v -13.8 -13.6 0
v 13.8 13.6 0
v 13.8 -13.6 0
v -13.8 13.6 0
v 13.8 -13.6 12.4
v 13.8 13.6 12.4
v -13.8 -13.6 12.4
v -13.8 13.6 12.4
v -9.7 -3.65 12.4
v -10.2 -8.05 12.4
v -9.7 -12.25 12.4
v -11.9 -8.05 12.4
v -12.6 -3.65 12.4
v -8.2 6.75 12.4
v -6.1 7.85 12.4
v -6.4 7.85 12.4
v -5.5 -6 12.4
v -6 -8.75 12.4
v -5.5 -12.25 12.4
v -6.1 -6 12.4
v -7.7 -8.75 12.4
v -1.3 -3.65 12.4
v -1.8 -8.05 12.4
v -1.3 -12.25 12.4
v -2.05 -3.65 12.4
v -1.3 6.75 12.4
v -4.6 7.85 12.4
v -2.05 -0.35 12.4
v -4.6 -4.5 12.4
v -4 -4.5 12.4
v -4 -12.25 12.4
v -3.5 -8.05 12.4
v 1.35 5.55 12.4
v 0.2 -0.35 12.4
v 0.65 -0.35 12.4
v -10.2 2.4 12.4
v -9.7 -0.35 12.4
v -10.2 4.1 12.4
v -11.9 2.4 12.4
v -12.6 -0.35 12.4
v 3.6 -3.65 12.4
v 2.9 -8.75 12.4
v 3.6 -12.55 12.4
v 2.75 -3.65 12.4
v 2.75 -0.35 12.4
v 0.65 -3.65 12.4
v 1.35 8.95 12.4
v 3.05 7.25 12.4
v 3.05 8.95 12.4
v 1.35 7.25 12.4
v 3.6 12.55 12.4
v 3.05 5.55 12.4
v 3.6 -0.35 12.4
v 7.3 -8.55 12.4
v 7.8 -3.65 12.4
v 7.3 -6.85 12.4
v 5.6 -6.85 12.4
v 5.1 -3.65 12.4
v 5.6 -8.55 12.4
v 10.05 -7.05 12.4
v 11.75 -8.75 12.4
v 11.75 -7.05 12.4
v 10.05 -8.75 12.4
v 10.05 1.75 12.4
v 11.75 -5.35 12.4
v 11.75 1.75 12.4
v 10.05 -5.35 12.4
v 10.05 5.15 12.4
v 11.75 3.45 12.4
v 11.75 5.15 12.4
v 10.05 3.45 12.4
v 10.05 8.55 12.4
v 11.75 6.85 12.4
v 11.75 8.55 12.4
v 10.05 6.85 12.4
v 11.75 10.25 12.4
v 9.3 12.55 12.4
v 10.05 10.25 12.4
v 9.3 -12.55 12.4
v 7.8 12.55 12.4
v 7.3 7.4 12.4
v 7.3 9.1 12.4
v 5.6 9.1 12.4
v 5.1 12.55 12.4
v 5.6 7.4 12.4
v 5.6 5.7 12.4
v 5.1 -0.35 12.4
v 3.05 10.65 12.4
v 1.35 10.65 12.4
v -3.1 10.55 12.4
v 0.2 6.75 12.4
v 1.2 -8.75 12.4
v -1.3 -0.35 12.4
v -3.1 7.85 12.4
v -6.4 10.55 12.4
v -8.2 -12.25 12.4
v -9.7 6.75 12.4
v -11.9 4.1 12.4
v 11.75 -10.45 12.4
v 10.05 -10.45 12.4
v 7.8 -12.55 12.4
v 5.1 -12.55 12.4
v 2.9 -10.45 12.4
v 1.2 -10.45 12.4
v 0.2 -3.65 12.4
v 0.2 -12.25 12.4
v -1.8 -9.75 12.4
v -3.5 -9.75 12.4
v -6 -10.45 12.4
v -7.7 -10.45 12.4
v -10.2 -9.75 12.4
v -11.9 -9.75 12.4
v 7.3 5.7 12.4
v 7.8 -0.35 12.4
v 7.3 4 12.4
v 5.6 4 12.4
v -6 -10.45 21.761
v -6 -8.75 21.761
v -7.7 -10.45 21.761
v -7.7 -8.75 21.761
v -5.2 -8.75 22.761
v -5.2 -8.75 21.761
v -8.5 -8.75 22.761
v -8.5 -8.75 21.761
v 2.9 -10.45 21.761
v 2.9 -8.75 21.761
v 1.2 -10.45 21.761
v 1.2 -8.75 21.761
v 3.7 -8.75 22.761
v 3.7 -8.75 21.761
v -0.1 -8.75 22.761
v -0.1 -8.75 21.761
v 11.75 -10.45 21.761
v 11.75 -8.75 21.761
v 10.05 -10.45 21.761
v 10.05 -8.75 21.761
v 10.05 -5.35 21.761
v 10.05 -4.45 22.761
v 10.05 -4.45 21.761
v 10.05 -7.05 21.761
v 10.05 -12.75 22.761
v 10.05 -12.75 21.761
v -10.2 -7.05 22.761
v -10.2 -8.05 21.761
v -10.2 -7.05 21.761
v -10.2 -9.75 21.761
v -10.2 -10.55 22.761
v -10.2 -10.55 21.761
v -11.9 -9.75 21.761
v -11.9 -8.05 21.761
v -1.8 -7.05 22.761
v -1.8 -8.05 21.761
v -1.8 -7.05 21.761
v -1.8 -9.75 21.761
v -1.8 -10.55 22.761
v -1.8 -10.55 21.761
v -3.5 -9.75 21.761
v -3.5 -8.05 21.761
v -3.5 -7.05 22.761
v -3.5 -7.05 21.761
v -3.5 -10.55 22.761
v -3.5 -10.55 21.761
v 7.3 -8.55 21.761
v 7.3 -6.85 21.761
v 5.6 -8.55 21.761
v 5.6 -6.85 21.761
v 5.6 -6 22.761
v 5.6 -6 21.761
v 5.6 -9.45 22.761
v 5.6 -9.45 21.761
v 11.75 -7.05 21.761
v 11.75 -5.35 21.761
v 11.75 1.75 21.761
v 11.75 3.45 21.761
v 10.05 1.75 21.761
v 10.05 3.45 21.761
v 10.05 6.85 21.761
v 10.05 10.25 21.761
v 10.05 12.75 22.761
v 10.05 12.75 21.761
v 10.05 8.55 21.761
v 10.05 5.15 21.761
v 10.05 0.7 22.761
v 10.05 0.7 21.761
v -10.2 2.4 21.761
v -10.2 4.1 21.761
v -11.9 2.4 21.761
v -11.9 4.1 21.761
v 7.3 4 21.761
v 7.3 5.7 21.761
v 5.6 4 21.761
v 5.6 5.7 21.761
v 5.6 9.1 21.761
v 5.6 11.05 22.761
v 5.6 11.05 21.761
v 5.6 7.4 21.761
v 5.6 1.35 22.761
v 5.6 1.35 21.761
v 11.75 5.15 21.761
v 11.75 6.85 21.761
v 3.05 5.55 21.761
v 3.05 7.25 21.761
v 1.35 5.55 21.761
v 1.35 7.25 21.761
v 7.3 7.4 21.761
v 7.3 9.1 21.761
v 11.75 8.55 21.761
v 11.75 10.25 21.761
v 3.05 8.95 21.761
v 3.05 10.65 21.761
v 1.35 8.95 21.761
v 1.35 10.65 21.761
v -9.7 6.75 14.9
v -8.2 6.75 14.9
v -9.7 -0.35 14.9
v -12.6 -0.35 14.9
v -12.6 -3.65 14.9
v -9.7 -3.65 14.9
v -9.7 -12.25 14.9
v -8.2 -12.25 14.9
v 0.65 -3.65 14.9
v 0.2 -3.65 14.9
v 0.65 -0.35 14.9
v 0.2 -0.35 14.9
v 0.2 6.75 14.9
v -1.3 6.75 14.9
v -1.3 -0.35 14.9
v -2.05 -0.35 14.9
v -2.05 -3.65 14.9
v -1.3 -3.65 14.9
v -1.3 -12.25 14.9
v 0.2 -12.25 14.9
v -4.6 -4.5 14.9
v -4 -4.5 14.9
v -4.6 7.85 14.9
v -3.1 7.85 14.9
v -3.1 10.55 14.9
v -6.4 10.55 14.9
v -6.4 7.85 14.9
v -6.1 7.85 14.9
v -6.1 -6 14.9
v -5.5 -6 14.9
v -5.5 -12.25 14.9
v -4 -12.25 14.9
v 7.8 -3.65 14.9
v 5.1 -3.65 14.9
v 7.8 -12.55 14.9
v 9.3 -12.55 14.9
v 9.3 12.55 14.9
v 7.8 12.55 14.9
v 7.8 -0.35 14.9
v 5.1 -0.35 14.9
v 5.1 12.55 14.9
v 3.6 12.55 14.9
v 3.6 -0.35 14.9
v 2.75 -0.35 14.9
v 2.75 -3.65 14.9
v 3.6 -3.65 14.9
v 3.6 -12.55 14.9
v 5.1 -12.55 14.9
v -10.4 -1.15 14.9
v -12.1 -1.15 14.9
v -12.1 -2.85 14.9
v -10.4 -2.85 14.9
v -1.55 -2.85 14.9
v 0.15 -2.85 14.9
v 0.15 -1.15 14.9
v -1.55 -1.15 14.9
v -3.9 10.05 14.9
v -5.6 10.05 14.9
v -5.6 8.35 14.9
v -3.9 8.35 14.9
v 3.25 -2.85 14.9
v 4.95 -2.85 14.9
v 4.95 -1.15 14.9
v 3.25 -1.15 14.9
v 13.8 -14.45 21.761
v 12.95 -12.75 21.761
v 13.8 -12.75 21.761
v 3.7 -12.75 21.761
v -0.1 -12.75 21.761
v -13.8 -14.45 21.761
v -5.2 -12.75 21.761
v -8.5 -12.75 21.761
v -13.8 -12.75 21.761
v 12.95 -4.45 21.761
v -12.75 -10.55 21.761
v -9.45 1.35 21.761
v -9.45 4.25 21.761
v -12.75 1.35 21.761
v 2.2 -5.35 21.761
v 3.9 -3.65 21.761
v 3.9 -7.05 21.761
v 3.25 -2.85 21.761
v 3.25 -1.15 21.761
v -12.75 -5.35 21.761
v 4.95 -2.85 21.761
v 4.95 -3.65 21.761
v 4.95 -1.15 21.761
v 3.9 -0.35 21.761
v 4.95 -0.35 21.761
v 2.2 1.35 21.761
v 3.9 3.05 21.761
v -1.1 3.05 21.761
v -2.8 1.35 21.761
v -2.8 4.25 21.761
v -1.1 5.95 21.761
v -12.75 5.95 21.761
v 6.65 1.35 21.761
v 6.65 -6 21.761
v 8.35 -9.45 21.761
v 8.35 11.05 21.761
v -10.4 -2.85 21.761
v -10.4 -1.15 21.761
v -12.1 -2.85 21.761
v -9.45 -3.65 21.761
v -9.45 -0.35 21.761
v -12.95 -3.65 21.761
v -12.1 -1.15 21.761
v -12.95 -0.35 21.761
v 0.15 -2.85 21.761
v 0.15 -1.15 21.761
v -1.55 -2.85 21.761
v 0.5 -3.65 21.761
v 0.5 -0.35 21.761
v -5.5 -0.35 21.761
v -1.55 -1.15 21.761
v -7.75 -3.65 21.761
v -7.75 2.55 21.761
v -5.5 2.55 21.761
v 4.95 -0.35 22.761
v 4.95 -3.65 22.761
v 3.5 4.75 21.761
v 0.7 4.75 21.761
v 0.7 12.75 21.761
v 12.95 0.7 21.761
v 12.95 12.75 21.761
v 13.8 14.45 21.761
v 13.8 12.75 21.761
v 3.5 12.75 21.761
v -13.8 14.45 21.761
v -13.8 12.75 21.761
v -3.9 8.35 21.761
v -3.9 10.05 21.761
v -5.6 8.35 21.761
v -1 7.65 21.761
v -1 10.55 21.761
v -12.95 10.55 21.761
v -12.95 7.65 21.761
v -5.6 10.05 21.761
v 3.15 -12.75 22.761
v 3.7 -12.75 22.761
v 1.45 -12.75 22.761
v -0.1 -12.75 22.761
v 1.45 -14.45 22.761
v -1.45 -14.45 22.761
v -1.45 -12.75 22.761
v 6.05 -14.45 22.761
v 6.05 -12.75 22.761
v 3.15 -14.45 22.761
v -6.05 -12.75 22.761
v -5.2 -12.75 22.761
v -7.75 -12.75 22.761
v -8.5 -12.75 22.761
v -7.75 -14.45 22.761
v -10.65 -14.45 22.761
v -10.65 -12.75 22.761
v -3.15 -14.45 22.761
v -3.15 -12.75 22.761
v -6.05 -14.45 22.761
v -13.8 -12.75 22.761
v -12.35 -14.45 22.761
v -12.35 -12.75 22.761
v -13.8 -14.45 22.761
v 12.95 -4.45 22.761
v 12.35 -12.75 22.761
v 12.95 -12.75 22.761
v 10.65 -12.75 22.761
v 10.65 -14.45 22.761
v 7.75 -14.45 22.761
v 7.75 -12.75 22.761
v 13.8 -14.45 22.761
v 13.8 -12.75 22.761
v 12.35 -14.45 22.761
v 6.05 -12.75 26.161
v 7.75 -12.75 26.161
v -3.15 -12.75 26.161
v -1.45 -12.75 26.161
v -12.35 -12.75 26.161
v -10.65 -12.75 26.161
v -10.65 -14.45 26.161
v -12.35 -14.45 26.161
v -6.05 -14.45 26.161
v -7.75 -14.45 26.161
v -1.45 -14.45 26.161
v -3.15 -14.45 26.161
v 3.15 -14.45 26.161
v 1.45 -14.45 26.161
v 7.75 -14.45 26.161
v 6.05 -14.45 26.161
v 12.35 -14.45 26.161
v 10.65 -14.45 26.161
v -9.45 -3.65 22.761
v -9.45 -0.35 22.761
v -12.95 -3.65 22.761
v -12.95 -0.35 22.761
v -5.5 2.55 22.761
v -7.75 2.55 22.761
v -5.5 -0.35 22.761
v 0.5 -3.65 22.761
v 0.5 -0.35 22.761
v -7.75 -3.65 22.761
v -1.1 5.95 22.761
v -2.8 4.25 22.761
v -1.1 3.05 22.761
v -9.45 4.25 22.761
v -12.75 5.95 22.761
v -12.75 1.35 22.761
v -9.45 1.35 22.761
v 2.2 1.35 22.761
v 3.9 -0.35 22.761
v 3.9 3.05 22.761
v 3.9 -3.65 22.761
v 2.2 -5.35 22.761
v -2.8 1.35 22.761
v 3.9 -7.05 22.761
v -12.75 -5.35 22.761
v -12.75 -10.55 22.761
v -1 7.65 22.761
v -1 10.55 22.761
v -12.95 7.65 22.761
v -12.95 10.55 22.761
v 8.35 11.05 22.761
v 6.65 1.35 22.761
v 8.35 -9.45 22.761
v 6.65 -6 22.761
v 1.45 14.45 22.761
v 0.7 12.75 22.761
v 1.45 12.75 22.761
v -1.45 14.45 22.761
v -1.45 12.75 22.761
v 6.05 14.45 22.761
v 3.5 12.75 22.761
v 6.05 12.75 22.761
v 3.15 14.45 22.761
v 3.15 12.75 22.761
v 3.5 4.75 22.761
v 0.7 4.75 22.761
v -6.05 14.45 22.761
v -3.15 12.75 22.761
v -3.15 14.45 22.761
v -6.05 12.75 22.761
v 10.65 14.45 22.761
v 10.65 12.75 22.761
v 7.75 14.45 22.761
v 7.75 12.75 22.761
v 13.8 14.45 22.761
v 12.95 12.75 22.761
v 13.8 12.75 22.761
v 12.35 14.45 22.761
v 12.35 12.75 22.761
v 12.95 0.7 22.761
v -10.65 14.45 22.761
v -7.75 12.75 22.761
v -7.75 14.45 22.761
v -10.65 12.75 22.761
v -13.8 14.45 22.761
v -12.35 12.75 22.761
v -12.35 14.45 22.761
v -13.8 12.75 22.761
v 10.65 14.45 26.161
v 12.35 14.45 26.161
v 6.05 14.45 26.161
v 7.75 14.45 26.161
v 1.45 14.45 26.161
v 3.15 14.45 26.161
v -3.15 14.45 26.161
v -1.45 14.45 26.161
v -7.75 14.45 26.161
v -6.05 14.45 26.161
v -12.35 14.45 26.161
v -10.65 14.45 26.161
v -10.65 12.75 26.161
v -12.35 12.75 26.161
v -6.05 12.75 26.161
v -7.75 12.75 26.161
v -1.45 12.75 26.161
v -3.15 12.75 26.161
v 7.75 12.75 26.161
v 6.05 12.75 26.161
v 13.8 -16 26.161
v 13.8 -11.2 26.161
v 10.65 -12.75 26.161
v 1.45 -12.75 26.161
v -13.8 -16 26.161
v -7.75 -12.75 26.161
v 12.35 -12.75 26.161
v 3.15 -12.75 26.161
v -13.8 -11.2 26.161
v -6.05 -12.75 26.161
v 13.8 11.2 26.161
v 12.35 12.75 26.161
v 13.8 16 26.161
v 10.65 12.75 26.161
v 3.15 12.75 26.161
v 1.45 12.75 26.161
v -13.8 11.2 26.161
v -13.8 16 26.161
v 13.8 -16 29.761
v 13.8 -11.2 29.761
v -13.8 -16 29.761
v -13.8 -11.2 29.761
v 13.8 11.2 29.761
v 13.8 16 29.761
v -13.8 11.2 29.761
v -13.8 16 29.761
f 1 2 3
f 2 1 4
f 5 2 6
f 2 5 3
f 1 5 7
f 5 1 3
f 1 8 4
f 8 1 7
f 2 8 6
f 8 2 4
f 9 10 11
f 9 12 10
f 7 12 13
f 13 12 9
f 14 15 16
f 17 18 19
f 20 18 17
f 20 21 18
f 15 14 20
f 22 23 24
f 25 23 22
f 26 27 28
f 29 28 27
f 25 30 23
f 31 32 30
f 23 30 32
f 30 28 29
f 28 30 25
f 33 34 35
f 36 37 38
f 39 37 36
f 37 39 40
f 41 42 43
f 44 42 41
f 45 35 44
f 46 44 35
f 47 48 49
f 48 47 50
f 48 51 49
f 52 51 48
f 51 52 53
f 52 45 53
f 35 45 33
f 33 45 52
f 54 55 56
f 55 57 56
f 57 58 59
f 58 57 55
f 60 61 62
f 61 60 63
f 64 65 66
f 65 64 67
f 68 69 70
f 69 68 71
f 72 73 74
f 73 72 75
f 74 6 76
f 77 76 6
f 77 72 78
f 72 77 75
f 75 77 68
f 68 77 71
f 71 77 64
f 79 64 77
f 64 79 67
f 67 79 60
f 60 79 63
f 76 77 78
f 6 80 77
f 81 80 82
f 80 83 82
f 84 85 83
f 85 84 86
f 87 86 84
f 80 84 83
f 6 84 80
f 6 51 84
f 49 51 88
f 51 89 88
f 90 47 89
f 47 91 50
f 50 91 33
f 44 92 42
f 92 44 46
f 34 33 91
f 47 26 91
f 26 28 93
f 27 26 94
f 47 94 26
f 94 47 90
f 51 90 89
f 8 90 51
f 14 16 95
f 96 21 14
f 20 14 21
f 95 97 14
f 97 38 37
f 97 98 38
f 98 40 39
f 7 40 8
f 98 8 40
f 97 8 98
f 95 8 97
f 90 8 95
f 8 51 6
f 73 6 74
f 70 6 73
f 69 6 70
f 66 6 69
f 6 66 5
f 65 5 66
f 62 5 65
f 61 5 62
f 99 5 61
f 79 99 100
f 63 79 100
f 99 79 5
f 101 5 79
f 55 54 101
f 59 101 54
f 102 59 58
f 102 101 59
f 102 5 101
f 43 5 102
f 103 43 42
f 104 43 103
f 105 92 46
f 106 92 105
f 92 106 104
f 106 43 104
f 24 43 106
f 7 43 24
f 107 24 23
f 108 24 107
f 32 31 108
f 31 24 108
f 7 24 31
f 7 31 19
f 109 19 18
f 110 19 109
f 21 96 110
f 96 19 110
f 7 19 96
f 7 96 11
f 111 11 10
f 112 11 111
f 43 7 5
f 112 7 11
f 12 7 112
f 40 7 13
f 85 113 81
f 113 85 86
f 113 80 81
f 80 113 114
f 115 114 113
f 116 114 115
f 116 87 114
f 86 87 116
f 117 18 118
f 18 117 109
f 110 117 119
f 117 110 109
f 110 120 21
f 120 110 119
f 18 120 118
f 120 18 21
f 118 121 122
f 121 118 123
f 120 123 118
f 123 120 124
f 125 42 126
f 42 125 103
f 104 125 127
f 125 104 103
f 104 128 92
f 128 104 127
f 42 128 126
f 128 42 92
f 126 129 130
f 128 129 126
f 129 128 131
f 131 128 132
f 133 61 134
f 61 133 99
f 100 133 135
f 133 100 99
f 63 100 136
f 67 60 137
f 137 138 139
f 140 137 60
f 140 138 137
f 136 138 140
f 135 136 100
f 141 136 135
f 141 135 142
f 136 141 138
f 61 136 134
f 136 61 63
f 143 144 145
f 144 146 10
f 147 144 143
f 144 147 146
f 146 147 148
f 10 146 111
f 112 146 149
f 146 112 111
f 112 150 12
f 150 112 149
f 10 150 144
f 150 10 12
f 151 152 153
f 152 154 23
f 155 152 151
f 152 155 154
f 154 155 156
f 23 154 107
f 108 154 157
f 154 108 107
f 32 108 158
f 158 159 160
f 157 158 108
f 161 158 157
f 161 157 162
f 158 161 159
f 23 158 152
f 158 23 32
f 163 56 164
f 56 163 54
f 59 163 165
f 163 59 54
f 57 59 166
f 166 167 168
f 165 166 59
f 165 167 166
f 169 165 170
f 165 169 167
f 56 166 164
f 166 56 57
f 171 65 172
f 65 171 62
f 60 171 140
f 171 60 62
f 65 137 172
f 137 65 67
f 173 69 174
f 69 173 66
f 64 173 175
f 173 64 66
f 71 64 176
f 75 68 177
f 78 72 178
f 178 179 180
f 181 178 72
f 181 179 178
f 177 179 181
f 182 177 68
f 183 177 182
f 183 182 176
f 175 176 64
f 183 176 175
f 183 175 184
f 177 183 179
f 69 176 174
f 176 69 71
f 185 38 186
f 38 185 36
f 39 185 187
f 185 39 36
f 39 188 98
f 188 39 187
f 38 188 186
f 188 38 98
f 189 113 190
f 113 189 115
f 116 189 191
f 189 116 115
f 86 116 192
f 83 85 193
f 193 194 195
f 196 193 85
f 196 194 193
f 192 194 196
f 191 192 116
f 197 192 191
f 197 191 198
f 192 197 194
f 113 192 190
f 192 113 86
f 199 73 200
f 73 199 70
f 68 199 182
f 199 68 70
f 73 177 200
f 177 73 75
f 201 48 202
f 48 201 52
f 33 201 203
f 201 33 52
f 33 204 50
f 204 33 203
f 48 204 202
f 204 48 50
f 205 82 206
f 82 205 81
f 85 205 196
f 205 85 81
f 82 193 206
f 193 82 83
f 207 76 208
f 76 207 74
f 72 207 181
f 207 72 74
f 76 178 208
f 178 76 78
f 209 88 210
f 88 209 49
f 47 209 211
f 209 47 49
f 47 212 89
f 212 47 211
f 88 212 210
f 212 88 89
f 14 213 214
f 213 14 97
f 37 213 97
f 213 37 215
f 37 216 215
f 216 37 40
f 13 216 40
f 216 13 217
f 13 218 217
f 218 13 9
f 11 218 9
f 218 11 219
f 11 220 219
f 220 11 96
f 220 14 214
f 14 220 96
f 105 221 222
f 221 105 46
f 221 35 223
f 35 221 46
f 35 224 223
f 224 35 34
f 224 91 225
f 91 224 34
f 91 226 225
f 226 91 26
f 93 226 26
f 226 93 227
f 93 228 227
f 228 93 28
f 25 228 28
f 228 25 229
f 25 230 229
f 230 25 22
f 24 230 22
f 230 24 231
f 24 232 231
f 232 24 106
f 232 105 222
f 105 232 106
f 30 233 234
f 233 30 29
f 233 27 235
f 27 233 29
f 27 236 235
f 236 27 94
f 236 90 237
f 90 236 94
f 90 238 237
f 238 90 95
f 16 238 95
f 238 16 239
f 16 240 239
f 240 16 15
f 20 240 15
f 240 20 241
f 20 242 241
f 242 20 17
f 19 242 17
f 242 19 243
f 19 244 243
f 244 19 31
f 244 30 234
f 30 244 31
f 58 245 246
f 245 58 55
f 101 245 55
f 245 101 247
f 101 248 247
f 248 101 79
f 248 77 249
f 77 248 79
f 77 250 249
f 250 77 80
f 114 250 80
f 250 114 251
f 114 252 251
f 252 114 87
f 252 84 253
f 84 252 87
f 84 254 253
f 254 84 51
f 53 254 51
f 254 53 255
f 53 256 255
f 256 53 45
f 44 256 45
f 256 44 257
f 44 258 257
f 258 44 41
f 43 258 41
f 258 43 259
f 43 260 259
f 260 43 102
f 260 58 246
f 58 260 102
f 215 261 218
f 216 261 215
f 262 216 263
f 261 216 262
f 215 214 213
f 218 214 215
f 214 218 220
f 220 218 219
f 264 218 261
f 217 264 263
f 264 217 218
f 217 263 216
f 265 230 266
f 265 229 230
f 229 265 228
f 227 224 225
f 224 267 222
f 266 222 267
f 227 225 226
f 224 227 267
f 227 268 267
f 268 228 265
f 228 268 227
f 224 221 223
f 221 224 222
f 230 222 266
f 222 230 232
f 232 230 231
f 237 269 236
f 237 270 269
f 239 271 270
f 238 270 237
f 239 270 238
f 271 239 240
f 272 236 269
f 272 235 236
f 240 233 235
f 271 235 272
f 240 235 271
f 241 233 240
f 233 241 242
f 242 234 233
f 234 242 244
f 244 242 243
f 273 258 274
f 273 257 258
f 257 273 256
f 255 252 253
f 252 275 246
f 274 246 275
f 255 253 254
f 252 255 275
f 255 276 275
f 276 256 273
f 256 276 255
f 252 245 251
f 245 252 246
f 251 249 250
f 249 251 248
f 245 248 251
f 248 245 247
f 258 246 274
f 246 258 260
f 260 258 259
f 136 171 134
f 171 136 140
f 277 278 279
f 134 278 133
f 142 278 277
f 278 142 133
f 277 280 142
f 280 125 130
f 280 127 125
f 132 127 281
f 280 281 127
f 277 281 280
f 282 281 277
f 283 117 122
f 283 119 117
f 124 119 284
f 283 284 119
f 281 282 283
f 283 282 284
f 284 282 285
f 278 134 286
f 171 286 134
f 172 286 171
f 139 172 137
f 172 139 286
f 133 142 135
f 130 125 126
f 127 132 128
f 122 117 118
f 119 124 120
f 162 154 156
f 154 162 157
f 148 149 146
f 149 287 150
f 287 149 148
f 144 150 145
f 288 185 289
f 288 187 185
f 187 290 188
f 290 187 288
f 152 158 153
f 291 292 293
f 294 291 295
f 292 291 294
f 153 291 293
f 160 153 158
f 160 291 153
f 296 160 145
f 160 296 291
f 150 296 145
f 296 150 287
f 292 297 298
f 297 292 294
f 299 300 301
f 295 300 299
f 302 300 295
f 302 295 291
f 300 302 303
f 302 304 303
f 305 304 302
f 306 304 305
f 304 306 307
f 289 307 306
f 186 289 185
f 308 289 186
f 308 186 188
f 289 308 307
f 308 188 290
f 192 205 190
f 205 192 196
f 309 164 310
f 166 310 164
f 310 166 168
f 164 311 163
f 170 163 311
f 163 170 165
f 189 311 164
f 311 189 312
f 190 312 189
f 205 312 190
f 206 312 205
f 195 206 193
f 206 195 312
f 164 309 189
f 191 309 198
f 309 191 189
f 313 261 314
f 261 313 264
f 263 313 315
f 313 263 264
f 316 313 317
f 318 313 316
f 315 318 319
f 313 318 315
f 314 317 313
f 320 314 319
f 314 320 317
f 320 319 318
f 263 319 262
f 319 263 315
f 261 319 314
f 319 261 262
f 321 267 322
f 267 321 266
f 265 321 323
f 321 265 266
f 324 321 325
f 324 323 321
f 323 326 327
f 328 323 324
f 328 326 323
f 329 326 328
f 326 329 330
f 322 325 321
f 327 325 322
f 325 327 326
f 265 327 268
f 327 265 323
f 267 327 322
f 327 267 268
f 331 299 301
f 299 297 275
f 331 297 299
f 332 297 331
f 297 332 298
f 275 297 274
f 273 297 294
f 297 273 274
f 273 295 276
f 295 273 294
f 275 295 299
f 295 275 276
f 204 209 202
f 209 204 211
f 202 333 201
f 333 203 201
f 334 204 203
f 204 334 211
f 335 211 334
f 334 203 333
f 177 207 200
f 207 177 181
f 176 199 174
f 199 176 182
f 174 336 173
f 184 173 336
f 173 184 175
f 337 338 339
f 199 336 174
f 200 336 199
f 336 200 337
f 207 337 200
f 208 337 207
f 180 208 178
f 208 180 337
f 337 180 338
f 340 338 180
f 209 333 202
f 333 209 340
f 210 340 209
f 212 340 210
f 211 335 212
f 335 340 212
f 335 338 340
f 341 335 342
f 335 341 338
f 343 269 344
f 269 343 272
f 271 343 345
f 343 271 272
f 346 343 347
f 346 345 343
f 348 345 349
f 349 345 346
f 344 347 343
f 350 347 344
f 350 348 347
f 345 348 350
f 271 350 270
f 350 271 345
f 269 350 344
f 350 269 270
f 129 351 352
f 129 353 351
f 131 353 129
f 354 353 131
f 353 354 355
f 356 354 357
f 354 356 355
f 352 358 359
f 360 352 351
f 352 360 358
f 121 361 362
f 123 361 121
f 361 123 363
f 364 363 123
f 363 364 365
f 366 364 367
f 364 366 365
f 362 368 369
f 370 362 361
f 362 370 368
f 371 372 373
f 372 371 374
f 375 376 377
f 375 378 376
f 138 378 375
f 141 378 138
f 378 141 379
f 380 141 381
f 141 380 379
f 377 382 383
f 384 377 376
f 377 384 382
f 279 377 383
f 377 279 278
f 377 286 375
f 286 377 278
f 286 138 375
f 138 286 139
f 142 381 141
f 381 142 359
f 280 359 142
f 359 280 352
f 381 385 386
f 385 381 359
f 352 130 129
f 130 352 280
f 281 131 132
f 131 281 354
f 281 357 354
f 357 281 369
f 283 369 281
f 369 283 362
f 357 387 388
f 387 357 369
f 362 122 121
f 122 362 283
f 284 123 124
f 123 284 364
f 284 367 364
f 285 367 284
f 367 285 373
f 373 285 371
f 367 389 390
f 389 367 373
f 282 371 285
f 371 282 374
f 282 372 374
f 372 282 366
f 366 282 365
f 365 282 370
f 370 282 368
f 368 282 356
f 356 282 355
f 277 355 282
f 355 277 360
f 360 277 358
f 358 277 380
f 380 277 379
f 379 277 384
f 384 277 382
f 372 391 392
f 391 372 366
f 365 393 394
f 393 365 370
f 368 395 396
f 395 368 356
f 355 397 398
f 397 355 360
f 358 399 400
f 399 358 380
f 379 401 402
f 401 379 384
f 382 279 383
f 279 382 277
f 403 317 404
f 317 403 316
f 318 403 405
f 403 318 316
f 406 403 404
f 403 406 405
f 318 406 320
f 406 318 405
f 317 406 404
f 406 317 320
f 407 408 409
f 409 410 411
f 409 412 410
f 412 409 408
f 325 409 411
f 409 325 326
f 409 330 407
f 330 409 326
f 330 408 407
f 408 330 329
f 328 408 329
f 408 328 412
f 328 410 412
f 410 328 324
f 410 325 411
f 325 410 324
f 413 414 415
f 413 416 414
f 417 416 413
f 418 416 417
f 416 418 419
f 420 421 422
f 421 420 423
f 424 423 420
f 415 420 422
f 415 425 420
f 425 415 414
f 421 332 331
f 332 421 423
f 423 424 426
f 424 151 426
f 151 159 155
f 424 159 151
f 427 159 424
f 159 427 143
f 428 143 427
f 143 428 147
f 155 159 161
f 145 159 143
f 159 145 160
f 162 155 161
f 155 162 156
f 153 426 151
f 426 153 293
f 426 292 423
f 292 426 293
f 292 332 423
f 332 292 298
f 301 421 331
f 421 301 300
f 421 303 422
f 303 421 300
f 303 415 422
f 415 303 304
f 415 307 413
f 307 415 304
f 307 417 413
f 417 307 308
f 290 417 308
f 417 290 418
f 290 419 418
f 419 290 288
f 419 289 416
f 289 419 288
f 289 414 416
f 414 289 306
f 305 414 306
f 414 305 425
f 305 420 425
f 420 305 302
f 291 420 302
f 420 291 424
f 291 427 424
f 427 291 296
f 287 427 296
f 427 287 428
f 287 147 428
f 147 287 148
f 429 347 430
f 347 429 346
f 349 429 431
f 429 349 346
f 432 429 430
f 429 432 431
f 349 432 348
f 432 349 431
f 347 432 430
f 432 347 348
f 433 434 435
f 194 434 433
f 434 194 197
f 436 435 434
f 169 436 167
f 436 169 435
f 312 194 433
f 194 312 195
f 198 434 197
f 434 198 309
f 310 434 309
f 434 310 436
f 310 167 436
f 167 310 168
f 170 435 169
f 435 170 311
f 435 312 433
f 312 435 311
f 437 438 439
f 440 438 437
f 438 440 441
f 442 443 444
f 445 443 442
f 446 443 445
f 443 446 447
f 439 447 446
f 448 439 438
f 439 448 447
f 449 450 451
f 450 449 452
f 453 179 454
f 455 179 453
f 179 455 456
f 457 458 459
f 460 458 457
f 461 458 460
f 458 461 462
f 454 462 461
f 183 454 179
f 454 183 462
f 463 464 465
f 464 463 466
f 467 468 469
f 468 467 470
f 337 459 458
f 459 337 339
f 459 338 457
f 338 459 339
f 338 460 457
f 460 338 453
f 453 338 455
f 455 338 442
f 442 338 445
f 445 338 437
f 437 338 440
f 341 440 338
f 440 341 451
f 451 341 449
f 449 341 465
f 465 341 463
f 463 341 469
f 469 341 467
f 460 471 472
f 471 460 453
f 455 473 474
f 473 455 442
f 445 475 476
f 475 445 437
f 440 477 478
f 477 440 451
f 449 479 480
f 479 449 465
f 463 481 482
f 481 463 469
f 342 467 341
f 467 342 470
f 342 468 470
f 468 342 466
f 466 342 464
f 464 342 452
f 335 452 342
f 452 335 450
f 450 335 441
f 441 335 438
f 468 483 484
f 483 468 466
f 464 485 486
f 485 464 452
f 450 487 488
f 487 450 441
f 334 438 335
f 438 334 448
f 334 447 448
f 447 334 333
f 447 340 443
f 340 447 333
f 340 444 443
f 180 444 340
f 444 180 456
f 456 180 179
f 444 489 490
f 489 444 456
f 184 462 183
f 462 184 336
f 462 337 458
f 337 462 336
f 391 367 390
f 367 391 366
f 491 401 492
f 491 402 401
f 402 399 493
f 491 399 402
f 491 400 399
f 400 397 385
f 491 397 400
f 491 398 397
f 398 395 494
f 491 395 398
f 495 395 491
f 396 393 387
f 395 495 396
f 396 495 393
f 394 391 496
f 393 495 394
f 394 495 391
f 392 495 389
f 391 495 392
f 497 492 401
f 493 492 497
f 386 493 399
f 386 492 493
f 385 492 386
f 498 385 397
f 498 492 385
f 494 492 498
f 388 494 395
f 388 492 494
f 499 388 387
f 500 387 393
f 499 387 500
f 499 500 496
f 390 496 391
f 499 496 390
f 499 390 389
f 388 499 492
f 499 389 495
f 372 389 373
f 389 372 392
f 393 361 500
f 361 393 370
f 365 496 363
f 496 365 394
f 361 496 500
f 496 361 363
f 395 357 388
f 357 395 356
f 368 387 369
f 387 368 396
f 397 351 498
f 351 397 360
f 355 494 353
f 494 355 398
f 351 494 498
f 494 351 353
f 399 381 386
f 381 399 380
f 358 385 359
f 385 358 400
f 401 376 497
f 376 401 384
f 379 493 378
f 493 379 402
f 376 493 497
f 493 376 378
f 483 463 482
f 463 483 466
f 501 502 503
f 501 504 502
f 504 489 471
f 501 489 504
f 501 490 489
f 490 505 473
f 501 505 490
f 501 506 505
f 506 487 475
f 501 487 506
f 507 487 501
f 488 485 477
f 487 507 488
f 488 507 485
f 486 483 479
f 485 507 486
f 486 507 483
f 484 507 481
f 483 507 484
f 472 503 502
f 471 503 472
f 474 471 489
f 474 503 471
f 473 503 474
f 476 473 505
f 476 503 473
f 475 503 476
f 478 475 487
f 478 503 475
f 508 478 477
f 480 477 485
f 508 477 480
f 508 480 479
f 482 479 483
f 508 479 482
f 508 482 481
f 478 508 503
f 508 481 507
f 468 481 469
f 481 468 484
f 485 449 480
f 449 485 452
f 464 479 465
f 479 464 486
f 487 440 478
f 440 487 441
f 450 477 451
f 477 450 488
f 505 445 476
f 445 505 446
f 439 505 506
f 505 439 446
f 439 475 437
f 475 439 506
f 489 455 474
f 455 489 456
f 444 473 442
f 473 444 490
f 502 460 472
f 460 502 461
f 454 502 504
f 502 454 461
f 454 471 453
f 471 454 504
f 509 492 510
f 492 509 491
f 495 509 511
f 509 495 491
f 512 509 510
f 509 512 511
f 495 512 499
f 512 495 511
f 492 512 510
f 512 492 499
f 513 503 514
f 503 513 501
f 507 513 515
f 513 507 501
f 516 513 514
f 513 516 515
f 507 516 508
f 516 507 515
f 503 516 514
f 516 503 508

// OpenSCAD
// Generated by SolidPython 0.4.2 on 2020-09-29 23:22:12
//!OpenSCAD

scale(v = 0.0100000000) {
	translate(v = [-1380, -1360, 0]) {
		union() {
			color(c = [0.4000000000, 0.4000000000, 0.4000000000]) {
				translate(v = [0, 0, 0]) {
					linear_extrude(height = 1000.0000000000) {
						polygon(paths = [[0, 1, 2, 3]], points = [[0, 0], [0, 2720], [2760, 2720], [2760, 0]]);
					}
				}
			}
			color(c = [0.2000000000, 0.6000000000, 0.2000000000]) {
				translate(v = [0, 0, 1000.0000000000]) {
					linear_extrude(height = 120.0000000000) {
						polygon(paths = [[0, 1, 2, 3]], points = [[0, 1305], [0, 2720], [2760, 2720], [2760, 1305]]);
					}
				}
			}
			color(c = [0.4000000000, 0.4000000000, 0.4000000000]) {
				translate(v = [0, 0, 1000.0000000000]) {
					linear_extrude(height = 120.0000000000) {
						polygon(paths = [[0, 1, 2, 3]], points = [[0, 0], [0, 1305], [2760, 1305], [2760, 0]]);
					}
				}
			}
			color(c = [0.9000000000, 0.6000000000, 0.6000000000]) {
				translate(v = [0, 0, 1120.0000000000]) {
					linear_extrude(height = 120.0000000000) {
						polygon(paths = [[0, 1, 2, 3]], points = [[150, 1485], [150, 1905], [410, 1905], [410, 1485]]);
					}
				}
			}
			color(c = [0.9000000000, 0.6000000000, 0.6000000000]) {
				translate(v = [0, 0, 1120.0000000000]) {
					linear_extrude(height = 120.0000000000) {
						polygon(paths = [[0, 1, 2, 3]], points = [[560, 1485], [560, 1905], [770, 1905], [770, 1485]]);
					}
				}
			}
			color(c = [0.9000000000, 0.6000000000, 0.6000000000]) {
				translate(v = [0, 0, 1120.0000000000]) {
					linear_extrude(height = 120.0000000000) {
						polygon(paths = [[0, 1, 2, 3]], points = [[920, 1485], [920, 1905], [1250, 1905], [1250, 1485]]);
					}
				}
			}
			color(c = [0.9000000000, 0.6000000000, 0.6000000000]) {
				translate(v = [0, 0, 1120.0000000000]) {
					linear_extrude(height = 120.0000000000) {
						polygon(paths = [[0, 1, 2, 3, 4, 5]], points = [[1400, 1485], [1400, 1905], [1475, 1905], [1475, 2485], [1740, 2485], [1740, 1485]]);
					}
				}
			}
			color(c = [0.9000000000, 0.6000000000, 0.6000000000]) {
				translate(v = [0, 0, 1120.0000000000]) {
					linear_extrude(height = 120.0000000000) {
						polygon(paths = [[0, 1, 2, 3]], points = [[1890, 1485], [1890, 2485], [2160, 2485], [2160, 1485]]);
					}
				}
			}
			color(c = [0.9000000000, 0.6000000000, 0.6000000000]) {
				translate(v = [0, 0, 1120.0000000000]) {
					linear_extrude(height = 120.0000000000) {
						polygon(paths = [[0, 1, 2, 3]], points = [[2310, 1485], [2310, 2485], [2625, 2485], [2625, 1485]]);
					}
				}
			}
			color(c = [0.9000000000, 0.6000000000, 0.9000000000]) {
				translate(v = [0, 0, 1120.0000000000]) {
					linear_extrude(height = 120.0000000000) {
						polygon(paths = [[0, 1, 2, 3]], points = [[150, 265], [150, 685], [410, 685], [410, 265]]);
					}
				}
			}
			color(c = [0.9000000000, 0.6000000000, 0.9000000000]) {
				translate(v = [0, 0, 1120.0000000000]) {
					linear_extrude(height = 120.0000000000) {
						polygon(paths = [[0, 1, 2, 3]], points = [[560, 265], [560, 685], [830, 685], [830, 265]]);
					}
				}
			}
			color(c = [0.9000000000, 0.6000000000, 0.9000000000]) {
				translate(v = [0, 0, 1120.0000000000]) {
					linear_extrude(height = 120.0000000000) {
						polygon(paths = [[0, 1, 2, 3]], points = [[980, 265], [980, 685], [1250, 685], [1250, 265]]);
					}
				}
			}
			color(c = [0.9000000000, 0.6000000000, 0.9000000000]) {
				translate(v = [0, 0, 1120.0000000000]) {
					linear_extrude(height = 120.0000000000) {
						polygon(paths = [[0, 1, 2, 3, 4, 5, 6, 7]], points = [[1475, 235], [1475, 265], [1400, 265], [1400, 685], [1475, 685], [1475, 885], [1740, 885], [1740, 235]]);
					}
				}
			}
			color(c = [0.9000000000, 0.6000000000, 0.9000000000]) {
				translate(v = [0, 0, 1120.0000000000]) {
					linear_extrude(height = 120.0000000000) {
						polygon(paths = [[0, 1, 2, 3]], points = [[1890, 235], [1890, 885], [2160, 885], [2160, 235]]);
					}
				}
			}
			color(c = [0.9000000000, 0.6000000000, 0.9000000000]) {
				translate(v = [0, 0, 1120.0000000000]) {
					linear_extrude(height = 120.0000000000) {
						polygon(paths = [[0, 1, 2, 3]], points = [[2310, 235], [2310, 885], [2595, 885], [2595, 235]]);
					}
				}
			}
			color(c = [0.2000000000, 0.6000000000, 0.2000000000]) {
				translate(v = [0, 0, 1120.0000000000]) {
					linear_extrude(height = 120.0000000000) {
						difference() {
							polygon(paths = [[0, 1, 2, 3]], points = [[0, 1305], [0, 2720], [2760, 2720], [2760, 1305]]);
							polygon(paths = [[0, 1, 2, 3]], points = [[150, 1485], [410, 1485], [410, 1905], [150, 1905]]);
							polygon(paths = [[0, 1, 2, 3]], points = [[560, 1485], [770, 1485], [770, 1905], [560, 1905]]);
							polygon(paths = [[0, 1, 2, 3]], points = [[920, 1485], [1250, 1485], [1250, 1905], [920, 1905]]);
							polygon(paths = [[0, 1, 2, 3]], points = [[1890, 1485], [2160, 1485], [2160, 2485], [1890, 2485]]);
							polygon(paths = [[0, 1, 2, 3]], points = [[2310, 1485], [2625, 1485], [2625, 2485], [2310, 2485]]);
							polygon(paths = [[0, 1, 2, 3, 4, 5]], points = [[1400, 1485], [1740, 1485], [1740, 2485], [1475, 2485], [1475, 1905], [1400, 1905]]);
						}
					}
				}
			}
			color(c = [0.4000000000, 0.4000000000, 0.4000000000]) {
				translate(v = [0, 0, 1120.0000000000]) {
					linear_extrude(height = 120.0000000000) {
						difference() {
							polygon(paths = [[0, 1, 2, 3]], points = [[0, 0], [0, 1305], [2760, 1305], [2760, 0]]);
							polygon(paths = [[0, 1, 2, 3]], points = [[1890, 235], [2160, 235], [2160, 885], [1890, 885]]);
							polygon(paths = [[0, 1, 2, 3]], points = [[2310, 235], [2595, 235], [2595, 885], [2310, 885]]);
							polygon(paths = [[0, 1, 2, 3]], points = [[150, 265], [410, 265], [410, 685], [150, 685]]);
							polygon(paths = [[0, 1, 2, 3]], points = [[560, 265], [830, 265], [830, 685], [560, 685]]);
							polygon(paths = [[0, 1, 2, 3]], points = [[980, 265], [1250, 265], [1250, 685], [980, 685]]);
							polygon(paths = [[0, 1, 2, 3, 4, 5, 6, 7]], points = [[1475, 235], [1740, 235], [1740, 885], [1475, 885], [1475, 685], [1400, 685], [1400, 265], [1475, 265]]);
						}
					}
				}
			}
			color(c = [0.1000000000, 0.1000000000, 0.1000000000]) {
				translate(v = [0, 0, 1240.0000000000]) {
					linear_extrude(height = 70.0000000000) {
						polygon(paths = [[0, 1, 2, 3]], points = [[610, 315], [610, 485], [780, 485], [780, 315]]);
					}
				}
			}
			color(c = [0.1000000000, 0.1000000000, 0.1000000000]) {
				translate(v = [0, 0, 1240.0000000000]) {
					linear_extrude(height = 70.0000000000) {
						polygon(paths = [[0, 1, 2, 3]], points = [[1500, 315], [1500, 485], [1670, 485], [1670, 315]]);
					}
				}
			}
			color(c = [0.1000000000, 0.1000000000, 0.1000000000]) {
				translate(v = [0, 0, 1240.0000000000]) {
					linear_extrude(height = 70.0000000000) {
						polygon(paths = [[0, 1, 2, 3]], points = [[2385, 315], [2385, 485], [2555, 485], [2555, 315]]);
					}
				}
			}
			color(c = [0.1000000000, 0.1000000000, 0.1000000000]) {
				translate(v = [0, 0, 1240.0000000000]) {
					linear_extrude(height = 70.0000000000) {
						polygon(paths = [[0, 1, 2, 3]], points = [[190, 385], [190, 555], [360, 555], [360, 385]]);
					}
				}
			}
			color(c = [0.1000000000, 0.1000000000, 0.1000000000]) {
				translate(v = [0, 0, 1240.0000000000]) {
					linear_extrude(height = 70.0000000000) {
						polygon(paths = [[0, 1, 2, 3]], points = [[1030, 385], [1030, 555], [1200, 555], [1200, 385]]);
					}
				}
			}
			color(c = [0.1000000000, 0.1000000000, 0.1000000000]) {
				translate(v = [0, 0, 1240.0000000000]) {
					linear_extrude(height = 70.0000000000) {
						polygon(paths = [[0, 1, 2, 3]], points = [[1940, 505], [1940, 675], [2110, 675], [2110, 505]]);
					}
				}
			}
			color(c = [0.1000000000, 0.1000000000, 0.1000000000]) {
				translate(v = [0, 0, 1240.0000000000]) {
					linear_extrude(height = 70.0000000000) {
						polygon(paths = [[0, 1, 2, 3]], points = [[2385, 655], [2385, 825], [2555, 825], [2555, 655]]);
					}
				}
			}
			color(c = [0.1000000000, 0.1000000000, 0.1000000000]) {
				translate(v = [0, 0, 1240.0000000000]) {
					linear_extrude(height = 70.0000000000) {
						polygon(paths = [[0, 1, 2, 3]], points = [[2385, 1535], [2385, 1705], [2555, 1705], [2555, 1535]]);
					}
				}
			}
			color(c = [0.1000000000, 0.1000000000, 0.1000000000]) {
				translate(v = [0, 0, 1240.0000000000]) {
					linear_extrude(height = 70.0000000000) {
						polygon(paths = [[0, 1, 2, 3]], points = [[190, 1600], [190, 1770], [360, 1770], [360, 1600]]);
					}
				}
			}
			color(c = [0.1000000000, 0.1000000000, 0.1000000000]) {
				translate(v = [0, 0, 1240.0000000000]) {
					linear_extrude(height = 70.0000000000) {
						polygon(paths = [[0, 1, 2, 3]], points = [[1940, 1760], [1940, 1930], [2110, 1930], [2110, 1760]]);
					}
				}
			}
			color(c = [0.1000000000, 0.1000000000, 0.1000000000]) {
				translate(v = [0, 0, 1240.0000000000]) {
					linear_extrude(height = 70.0000000000) {
						polygon(paths = [[0, 1, 2, 3]], points = [[2385, 1875], [2385, 2045], [2555, 2045], [2555, 1875]]);
					}
				}
			}
			color(c = [0.1000000000, 0.1000000000, 0.1000000000]) {
				translate(v = [0, 0, 1240.0000000000]) {
					linear_extrude(height = 70.0000000000) {
						polygon(paths = [[0, 1, 2, 3]], points = [[1515, 1915], [1515, 2085], [1685, 2085], [1685, 1915]]);
					}
				}
			}
			color(c = [0.1000000000, 0.1000000000, 0.1000000000]) {
				translate(v = [0, 0, 1240.0000000000]) {
					linear_extrude(height = 70.0000000000) {
						polygon(paths = [[0, 1, 2, 3]], points = [[1940, 2100], [1940, 2270], [2110, 2270], [2110, 2100]]);
					}
				}
			}
			color(c = [0.1000000000, 0.1000000000, 0.1000000000]) {
				translate(v = [0, 0, 1240.0000000000]) {
					linear_extrude(height = 70.0000000000) {
						polygon(paths = [[0, 1, 2, 3]], points = [[2385, 2215], [2385, 2385], [2555, 2385], [2555, 2215]]);
					}
				}
			}
			color(c = [0.1000000000, 0.1000000000, 0.1000000000]) {
				translate(v = [0, 0, 1240.0000000000]) {
					linear_extrude(height = 70.0000000000) {
						polygon(paths = [[0, 1, 2, 3]], points = [[1515, 2255], [1515, 2425], [1685, 2425], [1685, 2255]]);
					}
				}
			}
			color(c = [1.0000000000, 1.0000000000, 1.0000000000]) {
				translate(v = [0, 0, 1240.0000000000]) {
					linear_extrude(height = 70.0000000000) {
						polygon(paths = [[0, 1, 2, 3, 4, 5, 6, 7]], points = [[410, 135], [410, 995], [120, 995], [120, 1325], [410, 1325], [410, 2035], [560, 2035], [560, 135]]);
					}
				}
			}
			color(c = [1.0000000000, 1.0000000000, 1.0000000000]) {
				translate(v = [0, 0, 1240.0000000000]) {
					linear_extrude(height = 70.0000000000) {
						polygon(paths = [[0, 1, 2, 3, 4, 5, 6, 7, 8, 9, 10, 11]], points = [[1250, 135], [1250, 995], [1175, 995], [1175, 1325], [1250, 1325], [1250, 2035], [1400, 2035], [1400, 1325], [1445, 1325], [1445, 995], [1400, 995], [1400, 135]]);
					}
				}
			}
			color(c = [1.0000000000, 1.0000000000, 1.0000000000]) {
				translate(v = [0, 0, 1240.0000000000]) {
					linear_extrude(height = 70.0000000000) {
						polygon(paths = [[0, 1, 2, 3, 4, 5, 6, 7, 8, 9, 10, 11]], points = [[830, 135], [830, 760], [770, 760], [770, 2145], [740, 2145], [740, 2415], [1070, 2415], [1070, 2145], [920, 2145], [920, 910], [980, 910], [980, 135]]);
					}
				}
			}
			color(c = [1.0000000000, 1.0000000000, 1.0000000000]) {
				translate(v = [0, 0, 1240.0000000000]) {
					linear_extrude(height = 70.0000000000) {
						polygon(paths = [[0, 1, 2, 3, 4, 5, 6, 7, 8, 9, 10, 11, 12, 13, 14, 15]], points = [[1740, 105], [1740, 995], [1655, 995], [1655, 1325], [1740, 1325], [1740, 2615], [1890, 2615], [1890, 1325], [2160, 1325], [2160, 2615], [2310, 2615], [2310, 105], [2160, 105], [2160, 995], [1890, 995], [1890, 105]]);
					}
				}
			}
			color(c = [0.1000000000, 0.1000000000, 0.1000000000]) {
				translate(v = [0, 0, 1310.0000000000]) {
					linear_extrude(height = 180.0000000000) {
						polygon(paths = [[0, 1, 2, 3]], points = [[610, 315], [610, 485], [780, 485], [780, 315]]);
					}
				}
			}
			color(c = [0.1000000000, 0.1000000000, 0.1000000000]) {
				translate(v = [0, 0, 1310.0000000000]) {
					linear_extrude(height = 180.0000000000) {
						polygon(paths = [[0, 1, 2, 3]], points = [[1500, 315], [1500, 485], [1670, 485], [1670, 315]]);
					}
				}
			}
			color(c = [0.1000000000, 0.1000000000, 0.1000000000]) {
				translate(v = [0, 0, 1310.0000000000]) {
					linear_extrude(height = 180.0000000000) {
						polygon(paths = [[0, 1, 2, 3]], points = [[2385, 315], [2385, 485], [2555, 485], [2555, 315]]);
					}
				}
			}
			color(c = [0.1000000000, 0.1000000000, 0.1000000000]) {
				translate(v = [0, 0, 1310.0000000000]) {
					linear_extrude(height = 180.0000000000) {
						polygon(paths = [[0, 1, 2, 3]], points = [[190, 385], [190, 555], [360, 555], [360, 385]]);
					}
				}
			}
			color(c = [0.1000000000, 0.1000000000, 0.1000000000]) {
				translate(v = [0, 0, 1310.0000000000]) {
					linear_extrude(height = 180.0000000000) {
						polygon(paths = [[0, 1, 2, 3]], points = [[1030, 385], [1030, 555], [1200, 555], [1200, 385]]);
					}
				}
			}
			color(c = [0.1000000000, 0.1000000000, 0.1000000000]) {
				translate(v = [0, 0, 1310.0000000000]) {
					linear_extrude(height = 180.0000000000) {
						polygon(paths = [[0, 1, 2, 3]], points = [[1940, 505], [1940, 675], [2110, 675], [2110, 505]]);
					}
				}
			}
			color(c = [0.1000000000, 0.1000000000, 0.1000000000]) {
				translate(v = [0, 0, 1310.0000000000]) {
					linear_extrude(height = 180.0000000000) {
						polygon(paths = [[0, 1, 2, 3]], points = [[2385, 655], [2385, 825], [2555, 825], [2555, 655]]);
					}
				}
			}
			color(c = [0.1000000000, 0.1000000000, 0.1000000000]) {
				translate(v = [0, 0, 1310.0000000000]) {
					linear_extrude(height = 180.0000000000) {
						polygon(paths = [[0, 1, 2, 3]], points = [[2385, 1535], [2385, 1705], [2555, 1705], [2555, 1535]]);
					}
				}
			}
			color(c = [0.1000000000, 0.1000000000, 0.1000000000]) {
				translate(v = [0, 0, 1310.0000000000]) {
					linear_extrude(height = 180.0000000000) {
						polygon(paths = [[0, 1, 2, 3]], points = [[190, 1600], [190, 1770], [360, 1770], [360, 1600]]);
					}
				}
			}
			color(c = [0.1000000000, 0.1000000000, 0.1000000000]) {
				translate(v = [0, 0, 1310.0000000000]) {
					linear_extrude(height = 180.0000000000) {
						polygon(paths = [[0, 1, 2, 3]], points = [[1940, 1760], [1940, 1930], [2110, 1930], [2110, 1760]]);
					}
				}
			}
			color(c = [0.1000000000, 0.1000000000, 0.1000000000]) {
				translate(v = [0, 0, 1310.0000000000]) {
					linear_extrude(height = 180.0000000000) {
						polygon(paths = [[0, 1, 2, 3]], points = [[2385, 1875], [2385, 2045], [2555, 2045], [2555, 1875]]);
					}
				}
			}
			color(c = [0.1000000000, 0.1000000000, 0.1000000000]) {
				translate(v = [0, 0, 1310.0000000000]) {
					linear_extrude(height = 180.0000000000) {
						polygon(paths = [[0, 1, 2, 3]], points = [[1515, 1915], [1515, 2085], [1685, 2085], [1685, 1915]]);
					}
				}
			}
			color(c = [0.1000000000, 0.1000000000, 0.1000000000]) {
				translate(v = [0, 0, 1310.0000000000]) {
					linear_extrude(height = 180.0000000000) {
						polygon(paths = [[0, 1, 2, 3]], points = [[1940, 2100], [1940, 2270], [2110, 2270], [2110, 2100]]);
					}
				}
			}
			color(c = [0.1000000000, 0.1000000000, 0.1000000000]) {
				translate(v = [0, 0, 1310.0000000000]) {
					linear_extrude(height = 180.0000000000) {
						polygon(paths = [[0, 1, 2, 3]], points = [[2385, 2215], [2385, 2385], [2555, 2385], [2555, 2215]]);
					}
				}
			}
			color(c = [0.1000000000, 0.1000000000, 0.1000000000]) {
				translate(v = [0, 0, 1310.0000000000]) {
					linear_extrude(height = 180.0000000000) {
						polygon(paths = [[0, 1, 2, 3]], points = [[1515, 2255], [1515, 2425], [1685, 2425], [1685, 2255]]);
					}
				}
			}
			color(c = [0.7000000000, 0, 0]) {
				translate(v = [0, 0, 1310.0000000000]) {
					linear_extrude(height = 180.0000000000) {
						polygon(paths = [[0, 1, 2, 3, 4, 5, 6, 7]], points = [[410, 135], [410, 995], [120, 995], [120, 1325], [410, 1325], [410, 2035], [560, 2035], [560, 135]]);
					}
				}
			}
			color(c = [0.7000000000, 0, 0]) {
				translate(v = [0, 0, 1310.0000000000]) {
					linear_extrude(height = 180.0000000000) {
						polygon(paths = [[0, 1, 2, 3, 4, 5, 6, 7, 8, 9, 10, 11]], points = [[1250, 135], [1250, 995], [1175, 995], [1175, 1325], [1250, 1325], [1250, 2035], [1400, 2035], [1400, 1325], [1445, 1325], [1445, 995], [1400, 995], [1400, 135]]);
					}
				}
			}
			color(c = [0.7000000000, 0, 0]) {
				translate(v = [0, 0, 1310.0000000000]) {
					linear_extrude(height = 180.0000000000) {
						polygon(paths = [[0, 1, 2, 3, 4, 5, 6, 7, 8, 9, 10, 11]], points = [[830, 135], [830, 760], [770, 760], [770, 2145], [740, 2145], [740, 2415], [1070, 2415], [1070, 2145], [920, 2145], [920, 910], [980, 910], [980, 135]]);
					}
				}
			}
			color(c = [0.7000000000, 0, 0]) {
				translate(v = [0, 0, 1310.0000000000]) {
					linear_extrude(height = 180.0000000000) {
						polygon(paths = [[0, 1, 2, 3, 4, 5, 6, 7, 8, 9, 10, 11, 12, 13, 14, 15]], points = [[1740, 105], [1740, 995], [1655, 995], [1655, 1325], [1740, 1325], [1740, 2615], [1890, 2615], [1890, 1325], [2160, 1325], [2160, 2615], [2310, 2615], [2310, 105], [2160, 105], [2160, 995], [1890, 995], [1890, 105]]);
					}
				}
			}
			color(c = [0.1000000000, 0.1000000000, 0.1000000000]) {
				translate(v = [0, 0, 1490.0000000000]) {
					linear_extrude(height = 686.1000000000) {
						polygon(paths = [[0, 1, 2, 3]], points = [[610, 315], [610, 485], [780, 485], [780, 315]]);
					}
				}
			}
			color(c = [0.1000000000, 0.1000000000, 0.1000000000]) {
				translate(v = [0, 0, 1490.0000000000]) {
					linear_extrude(height = 686.1000000000) {
						polygon(paths = [[0, 1, 2, 3]], points = [[1500, 315], [1500, 485], [1670, 485], [1670, 315]]);
					}
				}
			}
			color(c = [0.1000000000, 0.1000000000, 0.1000000000]) {
				translate(v = [0, 0, 1490.0000000000]) {
					linear_extrude(height = 686.1000000000) {
						polygon(paths = [[0, 1, 2, 3]], points = [[2385, 315], [2385, 485], [2555, 485], [2555, 315]]);
					}
				}
			}
			color(c = [0.1000000000, 0.1000000000, 0.1000000000]) {
				translate(v = [0, 0, 1490.0000000000]) {
					linear_extrude(height = 686.1000000000) {
						polygon(paths = [[0, 1, 2, 3]], points = [[190, 385], [190, 555], [360, 555], [360, 385]]);
					}
				}
			}
			color(c = [0.1000000000, 0.1000000000, 0.1000000000]) {
				translate(v = [0, 0, 1490.0000000000]) {
					linear_extrude(height = 686.1000000000) {
						polygon(paths = [[0, 1, 2, 3]], points = [[1030, 385], [1030, 555], [1200, 555], [1200, 385]]);
					}
				}
			}
			color(c = [0.1000000000, 0.1000000000, 0.1000000000]) {
				translate(v = [0, 0, 1490.0000000000]) {
					linear_extrude(height = 686.1000000000) {
						polygon(paths = [[0, 1, 2, 3]], points = [[1940, 505], [1940, 675], [2110, 675], [2110, 505]]);
					}
				}
			}
			color(c = [0.1000000000, 0.1000000000, 0.1000000000]) {
				translate(v = [0, 0, 1490.0000000000]) {
					linear_extrude(height = 686.1000000000) {
						polygon(paths = [[0, 1, 2, 3]], points = [[2385, 655], [2385, 825], [2555, 825], [2555, 655]]);
					}
				}
			}
			color(c = [0.1000000000, 0.1000000000, 0.1000000000]) {
				translate(v = [0, 0, 1490.0000000000]) {
					linear_extrude(height = 686.1000000000) {
						polygon(paths = [[0, 1, 2, 3]], points = [[170, 1075], [170, 1245], [340, 1245], [340, 1075]]);
					}
				}
			}
			color(c = [0.1000000000, 0.1000000000, 0.1000000000]) {
				translate(v = [0, 0, 1490.0000000000]) {
					linear_extrude(height = 686.1000000000) {
						polygon(paths = [[0, 1, 2, 3]], points = [[1225, 1075], [1225, 1245], [1395, 1245], [1395, 1075]]);
					}
				}
			}
			color(c = [0.1000000000, 0.1000000000, 0.1000000000]) {
				translate(v = [0, 0, 1490.0000000000]) {
					linear_extrude(height = 686.1000000000) {
						polygon(paths = [[0, 1, 2, 3]], points = [[1705, 1075], [1705, 1245], [1875, 1245], [1875, 1075]]);
					}
				}
			}
			color(c = [0.1000000000, 0.1000000000, 0.1000000000]) {
				translate(v = [0, 0, 1490.0000000000]) {
					linear_extrude(height = 686.1000000000) {
						polygon(paths = [[0, 1, 2, 3]], points = [[2385, 1535], [2385, 1705], [2555, 1705], [2555, 1535]]);
					}
				}
			}
			color(c = [0.1000000000, 0.1000000000, 0.1000000000]) {
				translate(v = [0, 0, 1490.0000000000]) {
					linear_extrude(height = 686.1000000000) {
						polygon(paths = [[0, 1, 2, 3]], points = [[190, 1600], [190, 1770], [360, 1770], [360, 1600]]);
					}
				}
			}
			color(c = [0.1000000000, 0.1000000000, 0.1000000000]) {
				translate(v = [0, 0, 1490.0000000000]) {
					linear_extrude(height = 686.1000000000) {
						polygon(paths = [[0, 1, 2, 3]], points = [[1940, 1760], [1940, 1930], [2110, 1930], [2110, 1760]]);
					}
				}
			}
			color(c = [0.1000000000, 0.1000000000, 0.1000000000]) {
				translate(v = [0, 0, 1490.0000000000]) {
					linear_extrude(height = 686.1000000000) {
						polygon(paths = [[0, 1, 2, 3]], points = [[2385, 1875], [2385, 2045], [2555, 2045], [2555, 1875]]);
					}
				}
			}
			color(c = [0.1000000000, 0.1000000000, 0.1000000000]) {
				translate(v = [0, 0, 1490.0000000000]) {
					linear_extrude(height = 686.1000000000) {
						polygon(paths = [[0, 1, 2, 3]], points = [[1515, 1915], [1515, 2085], [1685, 2085], [1685, 1915]]);
					}
				}
			}
			color(c = [0.1000000000, 0.1000000000, 0.1000000000]) {
				translate(v = [0, 0, 1490.0000000000]) {
					linear_extrude(height = 686.1000000000) {
						polygon(paths = [[0, 1, 2, 3]], points = [[1940, 2100], [1940, 2270], [2110, 2270], [2110, 2100]]);
					}
				}
			}
			color(c = [0.1000000000, 0.1000000000, 0.1000000000]) {
				translate(v = [0, 0, 1490.0000000000]) {
					linear_extrude(height = 686.1000000000) {
						polygon(paths = [[0, 1, 2, 3]], points = [[820, 2195], [820, 2365], [990, 2365], [990, 2195]]);
					}
				}
			}
			color(c = [0.1000000000, 0.1000000000, 0.1000000000]) {
				translate(v = [0, 0, 1490.0000000000]) {
					linear_extrude(height = 686.1000000000) {
						polygon(paths = [[0, 1, 2, 3]], points = [[2385, 2215], [2385, 2385], [2555, 2385], [2555, 2215]]);
					}
				}
			}
			color(c = [0.1000000000, 0.1000000000, 0.1000000000]) {
				translate(v = [0, 0, 1490.0000000000]) {
					linear_extrude(height = 686.1000000000) {
						polygon(paths = [[0, 1, 2, 3]], points = [[1515, 2255], [1515, 2425], [1685, 2425], [1685, 2255]]);
					}
				}
			}
			color(c = [0.9000000000, 0.6000000000, 0.6000000000]) {
				translate(v = [0, 0, 2176.1000000000]) {
					linear_extrude(height = 100.0000000000) {
						polygon(paths = [[0, 1, 2, 3, 4, 5, 6, 7, 8, 9, 10, 11, 12, 13, 14, 15]], points = [[0, -85], [0, 85], [530, 85], [530, 485], [860, 485], [860, 85], [1370, 85], [1370, 485], [1750, 485], [1750, 85], [2385, 85], [2385, 915], [2675, 915], [2675, 85], [2760, 85], [2760, -85]]);
					}
				}
			}
			color(c = [0.9000000000, 0.6000000000, 0.6000000000]) {
				translate(v = [0, 0, 2176.1000000000]) {
					linear_extrude(height = 100.0000000000) {
						polygon(paths = [[0, 1, 2, 3]], points = [[85, 995], [85, 1325], [435, 1325], [435, 995]]);
					}
				}
			}
			color(c = [0.9000000000, 0.6000000000, 0.6000000000]) {
				translate(v = [0, 0, 2176.1000000000]) {
					linear_extrude(height = 100.0000000000) {
						polygon(paths = [[0, 1, 2, 3, 4, 5]], points = [[605, 995], [605, 1615], [830, 1615], [830, 1325], [1430, 1325], [1430, 995]]);
					}
				}
			}
			color(c = [0.9000000000, 0.6000000000, 0.6000000000]) {
				translate(v = [0, 0, 2176.1000000000]) {
					linear_extrude(height = 100.0000000000) {
						polygon(paths = [[0, 1, 2, 3, 4, 5, 6, 7, 8, 9, 10, 11, 12, 13, 14, 15, 16, 17, 18, 19, 20, 21, 22, 23]], points = [[105, 305], [105, 825], [1600, 825], [1600, 1495], [1100, 1495], [1100, 1785], [435, 1785], [435, 1495], [105, 1495], [105, 1955], [1270, 1955], [1270, 1665], [1770, 1665], [1770, 1325], [1875, 1325], [1875, 995], [1770, 995], [1770, 655], [1200, 655], [1200, 305], [1030, 305], [1030, 655], [360, 655], [360, 305]]);
					}
				}
			}
			color(c = [0.9000000000, 0.6000000000, 0.6000000000]) {
				translate(v = [0, 0, 2176.1000000000]) {
					linear_extrude(height = 100.0000000000) {
						polygon(paths = [[0, 1, 2, 3]], points = [[85, 2125], [85, 2415], [1280, 2415], [1280, 2125]]);
					}
				}
			}
			color(c = [0.9000000000, 0.6000000000, 0.6000000000]) {
				translate(v = [0, 0, 2176.1000000000]) {
					linear_extrude(height = 100.0000000000) {
						polygon(paths = [[0, 1, 2, 3, 4, 5, 6, 7]], points = [[1940, 415], [1940, 760], [2045, 760], [2045, 1495], [1940, 1495], [1940, 2465], [2215, 2465], [2215, 415]]);
					}
				}
			}
			color(c = [0.9000000000, 0.6000000000, 0.6000000000]) {
				translate(v = [0, 0, 2176.1000000000]) {
					linear_extrude(height = 100.0000000000) {
						polygon(paths = [[0, 1, 2, 3, 4, 5, 6, 7, 8, 9, 10, 11]], points = [[2385, 1430], [2385, 2635], [1730, 2635], [1730, 1835], [1450, 1835], [1450, 2635], [0, 2635], [0, 2805], [2760, 2805], [2760, 2635], [2675, 2635], [2675, 1430]]);
					}
				}
			}
			color(c = [0.5000000000, 0.5000000000, 0.5000000000]) {
				translate(v = [0, 0, 2276.1000000000]) {
					linear_extrude(height = 340.0000000000) {
						polygon(paths = [[0, 1, 2, 3]], points = [[145, -85], [145, 85], [315, 85], [315, -85]]);
					}
				}
			}
			color(c = [0.5000000000, 0.5000000000, 0.5000000000]) {
				translate(v = [0, 0, 2276.1000000000]) {
					linear_extrude(height = 340.0000000000) {
						polygon(paths = [[0, 1, 2, 3]], points = [[605, -85], [605, 85], [775, 85], [775, -85]]);
					}
				}
			}
			color(c = [0.5000000000, 0.5000000000, 0.5000000000]) {
				translate(v = [0, 0, 2276.1000000000]) {
					linear_extrude(height = 340.0000000000) {
						polygon(paths = [[0, 1, 2, 3]], points = [[1065, -85], [1065, 85], [1235, 85], [1235, -85]]);
					}
				}
			}
			color(c = [0.5000000000, 0.5000000000, 0.5000000000]) {
				translate(v = [0, 0, 2276.1000000000]) {
					linear_extrude(height = 340.0000000000) {
						polygon(paths = [[0, 1, 2, 3]], points = [[1525, -85], [1525, 85], [1695, 85], [1695, -85]]);
					}
				}
			}
			color(c = [0.5000000000, 0.5000000000, 0.5000000000]) {
				translate(v = [0, 0, 2276.1000000000]) {
					linear_extrude(height = 340.0000000000) {
						polygon(paths = [[0, 1, 2, 3]], points = [[1985, -85], [1985, 85], [2155, 85], [2155, -85]]);
					}
				}
			}
			color(c = [0.5000000000, 0.5000000000, 0.5000000000]) {
				translate(v = [0, 0, 2276.1000000000]) {
					linear_extrude(height = 340.0000000000) {
						polygon(paths = [[0, 1, 2, 3]], points = [[2445, -85], [2445, 85], [2615, 85], [2615, -85]]);
					}
				}
			}
			color(c = [0.5000000000, 0.5000000000, 0.5000000000]) {
				translate(v = [0, 0, 2276.1000000000]) {
					linear_extrude(height = 340.0000000000) {
						polygon(paths = [[0, 1, 2, 3]], points = [[145, 2635], [145, 2805], [315, 2805], [315, 2635]]);
					}
				}
			}
			color(c = [0.5000000000, 0.5000000000, 0.5000000000]) {
				translate(v = [0, 0, 2276.1000000000]) {
					linear_extrude(height = 340.0000000000) {
						polygon(paths = [[0, 1, 2, 3]], points = [[605, 2635], [605, 2805], [775, 2805], [775, 2635]]);
					}
				}
			}
			color(c = [0.5000000000, 0.5000000000, 0.5000000000]) {
				translate(v = [0, 0, 2276.1000000000]) {
					linear_extrude(height = 340.0000000000) {
						polygon(paths = [[0, 1, 2, 3]], points = [[1065, 2635], [1065, 2805], [1235, 2805], [1235, 2635]]);
					}
				}
			}
			color(c = [0.5000000000, 0.5000000000, 0.5000000000]) {
				translate(v = [0, 0, 2276.1000000000]) {
					linear_extrude(height = 340.0000000000) {
						polygon(paths = [[0, 1, 2, 3]], points = [[1525, 2635], [1525, 2805], [1695, 2805], [1695, 2635]]);
					}
				}
			}
			color(c = [0.5000000000, 0.5000000000, 0.5000000000]) {
				translate(v = [0, 0, 2276.1000000000]) {
					linear_extrude(height = 340.0000000000) {
						polygon(paths = [[0, 1, 2, 3]], points = [[1985, 2635], [1985, 2805], [2155, 2805], [2155, 2635]]);
					}
				}
			}
			color(c = [0.5000000000, 0.5000000000, 0.5000000000]) {
				translate(v = [0, 0, 2276.1000000000]) {
					linear_extrude(height = 340.0000000000) {
						polygon(paths = [[0, 1, 2, 3]], points = [[2445, 2635], [2445, 2805], [2615, 2805], [2615, 2635]]);
					}
				}
			}
			color(c = [0.3000000000, 0.3000000000, 1]) {
				translate(v = [0, 0, 2616.1000000000]) {
					linear_extrude(height = 360.0000000000) {
						polygon(paths = [[0, 1, 2, 3]], points = [[0, -240], [0, 240], [2760, 240], [2760, -240]]);
					}
				}
			}
			color(c = [0.3000000000, 0.3000000000, 1]) {
				translate(v = [0, 0, 2616.1000000000]) {
					linear_extrude(height = 360.0000000000) {
						polygon(paths = [[0, 1, 2, 3]], points = [[0, 2480], [0, 2960], [2760, 2960], [2760, 2480]]);
					}
				}
			}
		}
	}
}
